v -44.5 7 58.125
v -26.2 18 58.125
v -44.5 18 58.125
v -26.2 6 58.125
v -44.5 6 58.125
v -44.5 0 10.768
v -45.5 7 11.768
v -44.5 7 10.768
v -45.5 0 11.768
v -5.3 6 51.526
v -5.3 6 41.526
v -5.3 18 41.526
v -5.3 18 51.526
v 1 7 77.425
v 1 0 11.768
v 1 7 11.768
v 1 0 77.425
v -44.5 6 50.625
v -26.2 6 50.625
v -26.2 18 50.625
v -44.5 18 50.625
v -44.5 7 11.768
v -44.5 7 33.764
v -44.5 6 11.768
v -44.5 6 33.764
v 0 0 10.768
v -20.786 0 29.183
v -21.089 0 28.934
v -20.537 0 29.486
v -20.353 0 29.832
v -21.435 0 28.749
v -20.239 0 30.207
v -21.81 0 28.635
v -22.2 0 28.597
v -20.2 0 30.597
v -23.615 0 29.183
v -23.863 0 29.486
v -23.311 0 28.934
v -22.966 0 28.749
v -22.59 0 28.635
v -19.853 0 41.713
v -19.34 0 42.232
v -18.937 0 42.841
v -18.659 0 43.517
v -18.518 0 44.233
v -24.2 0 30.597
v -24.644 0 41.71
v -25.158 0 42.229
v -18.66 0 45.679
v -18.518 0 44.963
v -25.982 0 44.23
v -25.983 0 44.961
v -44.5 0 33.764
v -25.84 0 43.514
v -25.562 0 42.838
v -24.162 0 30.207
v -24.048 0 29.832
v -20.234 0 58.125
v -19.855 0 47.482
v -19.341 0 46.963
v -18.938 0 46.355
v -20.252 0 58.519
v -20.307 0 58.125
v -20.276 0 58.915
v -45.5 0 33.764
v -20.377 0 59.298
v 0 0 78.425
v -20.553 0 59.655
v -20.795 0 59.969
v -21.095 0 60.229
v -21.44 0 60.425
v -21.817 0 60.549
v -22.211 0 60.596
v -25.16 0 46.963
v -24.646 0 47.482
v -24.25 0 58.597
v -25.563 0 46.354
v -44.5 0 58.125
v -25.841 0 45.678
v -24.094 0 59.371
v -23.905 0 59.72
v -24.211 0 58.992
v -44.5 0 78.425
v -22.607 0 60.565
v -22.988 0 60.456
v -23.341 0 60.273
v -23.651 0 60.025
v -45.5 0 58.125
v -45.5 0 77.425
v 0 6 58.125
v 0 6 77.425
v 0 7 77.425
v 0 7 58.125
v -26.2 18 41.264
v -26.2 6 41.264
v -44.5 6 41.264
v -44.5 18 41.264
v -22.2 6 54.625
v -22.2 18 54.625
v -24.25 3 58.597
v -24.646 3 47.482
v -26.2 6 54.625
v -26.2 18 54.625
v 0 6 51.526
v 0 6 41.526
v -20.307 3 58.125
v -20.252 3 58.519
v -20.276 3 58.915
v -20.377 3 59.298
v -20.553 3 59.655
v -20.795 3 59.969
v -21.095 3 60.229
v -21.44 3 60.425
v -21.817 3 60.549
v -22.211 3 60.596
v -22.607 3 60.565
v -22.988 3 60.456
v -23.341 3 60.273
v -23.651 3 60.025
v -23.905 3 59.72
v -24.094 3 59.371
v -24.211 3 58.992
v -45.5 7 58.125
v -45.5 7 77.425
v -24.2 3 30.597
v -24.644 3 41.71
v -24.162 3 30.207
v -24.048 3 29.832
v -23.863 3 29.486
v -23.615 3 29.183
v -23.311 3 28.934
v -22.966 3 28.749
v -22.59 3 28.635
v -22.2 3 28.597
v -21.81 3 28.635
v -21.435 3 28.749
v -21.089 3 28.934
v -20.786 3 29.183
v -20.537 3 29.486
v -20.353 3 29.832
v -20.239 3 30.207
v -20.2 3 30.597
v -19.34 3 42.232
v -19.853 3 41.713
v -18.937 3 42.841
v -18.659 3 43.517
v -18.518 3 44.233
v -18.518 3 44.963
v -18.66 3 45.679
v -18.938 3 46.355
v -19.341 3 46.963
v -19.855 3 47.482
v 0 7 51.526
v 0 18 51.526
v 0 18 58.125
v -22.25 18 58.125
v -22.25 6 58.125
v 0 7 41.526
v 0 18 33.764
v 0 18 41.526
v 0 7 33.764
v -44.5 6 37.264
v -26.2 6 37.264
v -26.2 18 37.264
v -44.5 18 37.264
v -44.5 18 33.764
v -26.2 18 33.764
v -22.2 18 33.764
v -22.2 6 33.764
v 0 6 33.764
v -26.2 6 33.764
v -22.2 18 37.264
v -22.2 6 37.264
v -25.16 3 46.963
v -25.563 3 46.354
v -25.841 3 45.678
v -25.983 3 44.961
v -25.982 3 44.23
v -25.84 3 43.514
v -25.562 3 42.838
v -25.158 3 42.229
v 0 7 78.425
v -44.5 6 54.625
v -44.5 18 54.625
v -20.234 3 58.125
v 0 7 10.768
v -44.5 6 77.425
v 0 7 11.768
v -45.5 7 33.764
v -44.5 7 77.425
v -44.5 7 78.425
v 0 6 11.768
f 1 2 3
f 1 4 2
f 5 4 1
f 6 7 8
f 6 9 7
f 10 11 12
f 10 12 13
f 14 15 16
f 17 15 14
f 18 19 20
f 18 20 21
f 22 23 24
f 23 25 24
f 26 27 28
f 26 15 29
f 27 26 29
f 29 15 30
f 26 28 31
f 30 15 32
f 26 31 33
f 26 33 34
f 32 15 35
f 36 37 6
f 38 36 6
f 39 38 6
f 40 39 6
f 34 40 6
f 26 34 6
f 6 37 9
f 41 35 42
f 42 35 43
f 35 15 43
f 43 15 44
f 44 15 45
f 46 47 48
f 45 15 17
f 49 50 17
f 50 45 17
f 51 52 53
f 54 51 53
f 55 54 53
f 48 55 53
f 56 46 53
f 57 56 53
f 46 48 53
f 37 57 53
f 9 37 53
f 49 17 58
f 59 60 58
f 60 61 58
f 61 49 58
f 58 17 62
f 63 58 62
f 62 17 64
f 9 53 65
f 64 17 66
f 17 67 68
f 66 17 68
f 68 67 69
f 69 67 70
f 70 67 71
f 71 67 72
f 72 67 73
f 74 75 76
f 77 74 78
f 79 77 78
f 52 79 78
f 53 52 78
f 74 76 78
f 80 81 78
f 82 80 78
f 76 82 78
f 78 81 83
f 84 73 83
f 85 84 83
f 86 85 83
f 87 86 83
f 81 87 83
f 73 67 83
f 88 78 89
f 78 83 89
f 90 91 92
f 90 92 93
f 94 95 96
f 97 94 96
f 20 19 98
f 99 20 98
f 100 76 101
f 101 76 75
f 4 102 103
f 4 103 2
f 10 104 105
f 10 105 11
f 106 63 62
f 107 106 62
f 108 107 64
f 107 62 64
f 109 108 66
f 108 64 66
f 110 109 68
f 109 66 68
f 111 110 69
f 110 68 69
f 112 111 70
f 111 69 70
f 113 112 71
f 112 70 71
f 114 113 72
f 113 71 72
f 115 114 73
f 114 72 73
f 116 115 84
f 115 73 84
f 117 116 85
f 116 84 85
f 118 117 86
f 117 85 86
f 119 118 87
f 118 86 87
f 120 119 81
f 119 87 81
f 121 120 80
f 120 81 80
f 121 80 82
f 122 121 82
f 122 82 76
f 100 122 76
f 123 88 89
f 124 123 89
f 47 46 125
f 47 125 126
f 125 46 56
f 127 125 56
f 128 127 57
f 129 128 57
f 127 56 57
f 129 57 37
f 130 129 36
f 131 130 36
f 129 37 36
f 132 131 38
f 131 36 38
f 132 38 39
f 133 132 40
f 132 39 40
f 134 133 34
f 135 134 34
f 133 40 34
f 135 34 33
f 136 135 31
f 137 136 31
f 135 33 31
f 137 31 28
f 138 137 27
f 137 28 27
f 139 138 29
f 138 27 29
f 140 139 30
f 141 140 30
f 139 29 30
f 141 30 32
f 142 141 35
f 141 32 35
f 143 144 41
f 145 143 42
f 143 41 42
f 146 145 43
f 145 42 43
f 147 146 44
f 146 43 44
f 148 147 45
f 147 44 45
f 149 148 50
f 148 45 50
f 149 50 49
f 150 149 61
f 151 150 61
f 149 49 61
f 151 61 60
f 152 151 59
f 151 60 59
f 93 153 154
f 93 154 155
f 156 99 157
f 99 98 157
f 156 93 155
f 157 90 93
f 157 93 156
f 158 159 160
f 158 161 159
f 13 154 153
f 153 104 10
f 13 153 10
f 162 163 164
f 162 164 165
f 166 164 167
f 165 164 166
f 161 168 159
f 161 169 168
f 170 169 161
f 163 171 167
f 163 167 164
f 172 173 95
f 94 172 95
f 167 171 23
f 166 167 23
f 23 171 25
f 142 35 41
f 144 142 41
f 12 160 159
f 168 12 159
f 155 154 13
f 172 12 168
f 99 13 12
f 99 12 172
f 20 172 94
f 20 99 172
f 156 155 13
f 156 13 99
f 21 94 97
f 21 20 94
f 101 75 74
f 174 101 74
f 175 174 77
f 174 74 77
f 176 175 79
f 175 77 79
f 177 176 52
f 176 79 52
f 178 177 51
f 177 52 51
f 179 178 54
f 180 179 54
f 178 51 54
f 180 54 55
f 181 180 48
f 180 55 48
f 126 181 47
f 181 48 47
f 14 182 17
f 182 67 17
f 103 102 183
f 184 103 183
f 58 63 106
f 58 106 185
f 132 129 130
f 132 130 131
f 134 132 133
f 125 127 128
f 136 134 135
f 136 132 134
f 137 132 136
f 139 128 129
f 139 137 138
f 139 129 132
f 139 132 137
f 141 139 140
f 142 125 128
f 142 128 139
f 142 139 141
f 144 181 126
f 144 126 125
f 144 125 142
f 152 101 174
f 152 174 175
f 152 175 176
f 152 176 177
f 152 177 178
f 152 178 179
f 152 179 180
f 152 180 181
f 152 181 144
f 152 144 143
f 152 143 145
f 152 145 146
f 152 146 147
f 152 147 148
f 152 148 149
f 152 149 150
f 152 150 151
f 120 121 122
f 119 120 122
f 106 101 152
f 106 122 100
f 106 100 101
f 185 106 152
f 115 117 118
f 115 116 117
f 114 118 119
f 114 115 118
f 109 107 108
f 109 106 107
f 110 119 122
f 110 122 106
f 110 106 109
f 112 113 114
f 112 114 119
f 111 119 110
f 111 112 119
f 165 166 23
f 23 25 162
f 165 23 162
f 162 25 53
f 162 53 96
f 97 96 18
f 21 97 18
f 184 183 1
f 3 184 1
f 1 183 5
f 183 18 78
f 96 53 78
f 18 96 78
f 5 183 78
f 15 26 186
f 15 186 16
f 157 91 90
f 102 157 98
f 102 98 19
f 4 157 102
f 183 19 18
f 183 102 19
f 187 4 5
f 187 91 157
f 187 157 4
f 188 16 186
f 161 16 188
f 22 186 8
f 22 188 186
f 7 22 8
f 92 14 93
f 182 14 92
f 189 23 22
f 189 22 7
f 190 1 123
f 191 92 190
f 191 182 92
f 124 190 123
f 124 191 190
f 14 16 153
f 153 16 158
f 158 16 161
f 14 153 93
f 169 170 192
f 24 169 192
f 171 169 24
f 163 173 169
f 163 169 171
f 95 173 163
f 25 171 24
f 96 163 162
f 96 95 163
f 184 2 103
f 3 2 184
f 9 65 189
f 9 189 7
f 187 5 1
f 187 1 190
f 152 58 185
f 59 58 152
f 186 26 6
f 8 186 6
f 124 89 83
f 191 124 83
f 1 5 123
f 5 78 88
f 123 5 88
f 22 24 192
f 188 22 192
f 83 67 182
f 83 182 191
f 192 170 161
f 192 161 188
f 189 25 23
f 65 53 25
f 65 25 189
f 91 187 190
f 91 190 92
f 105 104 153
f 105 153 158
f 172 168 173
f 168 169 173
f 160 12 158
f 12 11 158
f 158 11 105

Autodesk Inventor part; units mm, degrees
ref_plane "YZ Plane" through (0, 0, 0) normal (1, 0, 0) x (0, 1, 0)
ref_plane "XZ Plane" through (0, 0, 0) normal (0, 1, 0) x (-1, 0, 0)
ref_plane "XY Plane" through (0, 0, 0) normal (0, 0, 1) x (1, 0, 0)
sketch "Esboço1" plane through (0, 0, 0) normal (0, 1, 0) x (-1, 0, 0)
  line L0 (0.0003, 60.0007) -> (0.0003, 29.9998)
  line L1 (0.0003, 29.9998) -> (0.0003, 29.9999)
  line L2 (-0.9997, 29.9999) -> (-0.9997, 60.0007)
  line L3 (0.0003, 29.9999) -> (0.0003, 14.4635)
  line L4 (-0.9997, 14.4635) -> (-0.9997, 29.9999)
  line L5 (44.5003, 33.7635) -> (45.5003, 33.7635)
  line L6 (44.5003, 58.1254) -> (45.5003, 58.1254)
  line L7 (26.2003, 33.7635) -> (26.2003, 37.2635)
  line L8 (26.2003, 37.2635) -> (44.5003, 37.2635)
  line L9 (22.2003, 33.7635) -> (0.0003, 33.7635)
  line L10 (22.2003, 33.7635) -> (22.2003, 37.2635)
  line L11 (26.2003, 33.7635) -> (45.0003, 33.7635)
  line L12 (37.268, 41.2635) -> (44.5003, 41.2635)
  line L13 (22.2003, 37.2635) -> (26.2003, 41.2635)
  line L14 (37.268, 41.2635) -> (26.2003, 41.2635)
  line L15 (43.0622, 54.6254) -> (44.5003, 54.6254)
  line L16 (43.0622, 54.6254) -> (26.2003, 54.6254)
  line L17 (26.2003, 54.6254) -> (26.2003, 58.1254)
  line L18 (22.2003, 54.6254) -> (22.2503, 58.1254)
  line L19 (26.2003, 50.6254) -> (22.2003, 54.6254)
  line L20 (26.2003, 50.6254) -> (44.5003, 50.6254)
  line L21 (0.0003, 58.1254) -> (22.2503, 58.1254)
  line L22 (26.2003, 58.1254) -> (44.5003, 58.1254)
  line L23 (44.5003, 54.6254) -> (44.5003, 58.1254)
  line L24 (44.5003, 48.0257) -> (44.5003, 50.6254)
  line L25 (44.5003, 33.7635) -> (44.5003, 37.2635)
  line L26 (44.5003, 41.2635) -> (44.5003, 45.0257)
  line L27 (44.5003, 37.2635) -> (44.5003, 41.2635)
  line L28 (44.5003, 45.0257) -> (44.5003, 48.0257)
  line L29 (44.5003, 50.6254) -> (44.5003, 54.6254)
  line L30 (44.5003, 33.968) -> (44.5003, 11.768)
  line L31 (44.5003, 11.768) -> (0.0003, 11.768)
  line L32 (0.0003, 11.768) -> (0.0003, 14.4635)
  line L33 (45.5003, 33.7635) -> (45.5003, 11.768)
  line L34 (44.5003, 58.1254) -> (44.5003, 77.4254)
  line L35 (44.5003, 77.4254) -> (0.0003, 77.4254)
  line L36 (0.0003, 60.0007) -> (0.0003, 77.4254)
  line L37 (45.5003, 58.1254) -> (45.5003, 77.4254)
  line L38 (45.5003, 77.4254) -> (44.5003, 78.4254)
  line L39 (0.0003, 78.4254) -> (-0.9997, 77.4254)
  line L40 (0.0003, 78.4254) -> (44.5003, 78.4254)
  line L41 (-0.9997, 60.0007) -> (-0.9997, 77.4254)
  line L42 (0.0003, 10.768) -> (-0.9997, 11.768)
  line L43 (45.5003, 11.768) -> (44.5003, 10.768)
  line L44 (-0.9997, 11.768) -> (-0.9997, 14.4635)
  line L45 (0.0003, 10.768) -> (44.5003, 10.768)
  line L46 (4.3192, 41.5257) -> (5.3003, 41.5257)
  line L47 (4.8098, 51.5257) -> (5.3003, 51.5257)
  line L48 (5.3003, 41.5257) -> (5.3003, 51.5257)
  line L49 (4.3192, 41.5257) -> (0.0003, 41.5257)
  line L50 (4.8098, 51.5257) -> (0.0003, 51.5257)
  point P0 (0, 0)
  dimension "d40" = 1
  dimension "d86" = 44.5
  dimension "d90" = 1
  dimension "d91" = 1
  dimension "d94" = 4
  dimension "d116" = 22.2
  dimension "d118" = 19.3
extrude "Extrusão30" add sketch "Esboço1" along normal blind 6 contours L36 L35 L34 L22 L17 L16 L15 L29 L20 L19 L18 L21 L0 | L50 L47 L48 L46 L49 L0 | L9 L10 L13 L14 L12 L27 L8 L7 L11 L30 L31 L32 L3 L0
extrude "Extrusão32" add sketch "Esboço1" along normal blind 18 contours L21 L18 L19 L20 L24 L28 L26 L12 L14 L13 L10 L9 L0 L49 L46 L48 L47 L50 | L23 L15 L16 L17 L22 | L11 L7 L8 L25
extrude "Extrusão33" add sketch "Esboço1" along normal blind 7 contours L0 L3 L32 L31 L30 L5 L33 L43 L45 L42 L44 L4 L2 L41 L39 L40 L38 L37 L6 L34 L35 L36
sketch "Esboço4" plane through (0, 0, 0) normal (0, -1, 0) x (1, 0, 0)
  line L0 (-44.5003, 11.768) -> (-0.0003, 11.768) projected
  line L1 (-0.0003, 77.4254) -> (-44.5003, 77.4254) projected
  line L2 (-44.5003, 33.7635) -> (-44.5003, 58.1254) projected
  line L3 (-0.0003, 41.5257) -> (-0.0003, 51.5257) projected
  circle A0 centre (-22.2503, 44.5969) radius 3.75
  line L4 (-26.2003, 58.1254) -> (-26.2003, 54.6254) projected
  line L5 (-22.2503, 58.1254) -> (-0.0003, 58.1254) projected
  arc A1 (-20.3067, 58.1254) -> (-24.2503, 58.5969) centre (-22.2503, 58.5969) ccw
  arc A2 (-24.2003, 30.597) -> (-20.2003, 30.597) centre (-22.2003, 30.597) ccw
  line L6 (-22.2003, 33.7635) -> (-0.0003, 33.7635) projected
  line L7 (-24.2003, 30.597) -> (-24.6441, 41.7103)
  line L8 (-20.2003, 30.597) -> (-19.853, 41.7132)
  line L9 (-24.2503, 58.5969) -> (-24.6458, 47.4821)
  line L10 (-20.2503, 58.5969) -> (-19.8549, 47.4821)
  point P0 (0, 0)
  point P1 (-20.2336, 58.1254)
  dimension "d141" = 7.5
  dimension "d155" = 4
  dimension "d156" = 4
extrude "Extrusão35" cut sketch "Esboço4" against normal blind 3 contours A0 | A0 L9 A1 L5 L10 | L8 A2 L7 A0
properties part number "Suporte"
